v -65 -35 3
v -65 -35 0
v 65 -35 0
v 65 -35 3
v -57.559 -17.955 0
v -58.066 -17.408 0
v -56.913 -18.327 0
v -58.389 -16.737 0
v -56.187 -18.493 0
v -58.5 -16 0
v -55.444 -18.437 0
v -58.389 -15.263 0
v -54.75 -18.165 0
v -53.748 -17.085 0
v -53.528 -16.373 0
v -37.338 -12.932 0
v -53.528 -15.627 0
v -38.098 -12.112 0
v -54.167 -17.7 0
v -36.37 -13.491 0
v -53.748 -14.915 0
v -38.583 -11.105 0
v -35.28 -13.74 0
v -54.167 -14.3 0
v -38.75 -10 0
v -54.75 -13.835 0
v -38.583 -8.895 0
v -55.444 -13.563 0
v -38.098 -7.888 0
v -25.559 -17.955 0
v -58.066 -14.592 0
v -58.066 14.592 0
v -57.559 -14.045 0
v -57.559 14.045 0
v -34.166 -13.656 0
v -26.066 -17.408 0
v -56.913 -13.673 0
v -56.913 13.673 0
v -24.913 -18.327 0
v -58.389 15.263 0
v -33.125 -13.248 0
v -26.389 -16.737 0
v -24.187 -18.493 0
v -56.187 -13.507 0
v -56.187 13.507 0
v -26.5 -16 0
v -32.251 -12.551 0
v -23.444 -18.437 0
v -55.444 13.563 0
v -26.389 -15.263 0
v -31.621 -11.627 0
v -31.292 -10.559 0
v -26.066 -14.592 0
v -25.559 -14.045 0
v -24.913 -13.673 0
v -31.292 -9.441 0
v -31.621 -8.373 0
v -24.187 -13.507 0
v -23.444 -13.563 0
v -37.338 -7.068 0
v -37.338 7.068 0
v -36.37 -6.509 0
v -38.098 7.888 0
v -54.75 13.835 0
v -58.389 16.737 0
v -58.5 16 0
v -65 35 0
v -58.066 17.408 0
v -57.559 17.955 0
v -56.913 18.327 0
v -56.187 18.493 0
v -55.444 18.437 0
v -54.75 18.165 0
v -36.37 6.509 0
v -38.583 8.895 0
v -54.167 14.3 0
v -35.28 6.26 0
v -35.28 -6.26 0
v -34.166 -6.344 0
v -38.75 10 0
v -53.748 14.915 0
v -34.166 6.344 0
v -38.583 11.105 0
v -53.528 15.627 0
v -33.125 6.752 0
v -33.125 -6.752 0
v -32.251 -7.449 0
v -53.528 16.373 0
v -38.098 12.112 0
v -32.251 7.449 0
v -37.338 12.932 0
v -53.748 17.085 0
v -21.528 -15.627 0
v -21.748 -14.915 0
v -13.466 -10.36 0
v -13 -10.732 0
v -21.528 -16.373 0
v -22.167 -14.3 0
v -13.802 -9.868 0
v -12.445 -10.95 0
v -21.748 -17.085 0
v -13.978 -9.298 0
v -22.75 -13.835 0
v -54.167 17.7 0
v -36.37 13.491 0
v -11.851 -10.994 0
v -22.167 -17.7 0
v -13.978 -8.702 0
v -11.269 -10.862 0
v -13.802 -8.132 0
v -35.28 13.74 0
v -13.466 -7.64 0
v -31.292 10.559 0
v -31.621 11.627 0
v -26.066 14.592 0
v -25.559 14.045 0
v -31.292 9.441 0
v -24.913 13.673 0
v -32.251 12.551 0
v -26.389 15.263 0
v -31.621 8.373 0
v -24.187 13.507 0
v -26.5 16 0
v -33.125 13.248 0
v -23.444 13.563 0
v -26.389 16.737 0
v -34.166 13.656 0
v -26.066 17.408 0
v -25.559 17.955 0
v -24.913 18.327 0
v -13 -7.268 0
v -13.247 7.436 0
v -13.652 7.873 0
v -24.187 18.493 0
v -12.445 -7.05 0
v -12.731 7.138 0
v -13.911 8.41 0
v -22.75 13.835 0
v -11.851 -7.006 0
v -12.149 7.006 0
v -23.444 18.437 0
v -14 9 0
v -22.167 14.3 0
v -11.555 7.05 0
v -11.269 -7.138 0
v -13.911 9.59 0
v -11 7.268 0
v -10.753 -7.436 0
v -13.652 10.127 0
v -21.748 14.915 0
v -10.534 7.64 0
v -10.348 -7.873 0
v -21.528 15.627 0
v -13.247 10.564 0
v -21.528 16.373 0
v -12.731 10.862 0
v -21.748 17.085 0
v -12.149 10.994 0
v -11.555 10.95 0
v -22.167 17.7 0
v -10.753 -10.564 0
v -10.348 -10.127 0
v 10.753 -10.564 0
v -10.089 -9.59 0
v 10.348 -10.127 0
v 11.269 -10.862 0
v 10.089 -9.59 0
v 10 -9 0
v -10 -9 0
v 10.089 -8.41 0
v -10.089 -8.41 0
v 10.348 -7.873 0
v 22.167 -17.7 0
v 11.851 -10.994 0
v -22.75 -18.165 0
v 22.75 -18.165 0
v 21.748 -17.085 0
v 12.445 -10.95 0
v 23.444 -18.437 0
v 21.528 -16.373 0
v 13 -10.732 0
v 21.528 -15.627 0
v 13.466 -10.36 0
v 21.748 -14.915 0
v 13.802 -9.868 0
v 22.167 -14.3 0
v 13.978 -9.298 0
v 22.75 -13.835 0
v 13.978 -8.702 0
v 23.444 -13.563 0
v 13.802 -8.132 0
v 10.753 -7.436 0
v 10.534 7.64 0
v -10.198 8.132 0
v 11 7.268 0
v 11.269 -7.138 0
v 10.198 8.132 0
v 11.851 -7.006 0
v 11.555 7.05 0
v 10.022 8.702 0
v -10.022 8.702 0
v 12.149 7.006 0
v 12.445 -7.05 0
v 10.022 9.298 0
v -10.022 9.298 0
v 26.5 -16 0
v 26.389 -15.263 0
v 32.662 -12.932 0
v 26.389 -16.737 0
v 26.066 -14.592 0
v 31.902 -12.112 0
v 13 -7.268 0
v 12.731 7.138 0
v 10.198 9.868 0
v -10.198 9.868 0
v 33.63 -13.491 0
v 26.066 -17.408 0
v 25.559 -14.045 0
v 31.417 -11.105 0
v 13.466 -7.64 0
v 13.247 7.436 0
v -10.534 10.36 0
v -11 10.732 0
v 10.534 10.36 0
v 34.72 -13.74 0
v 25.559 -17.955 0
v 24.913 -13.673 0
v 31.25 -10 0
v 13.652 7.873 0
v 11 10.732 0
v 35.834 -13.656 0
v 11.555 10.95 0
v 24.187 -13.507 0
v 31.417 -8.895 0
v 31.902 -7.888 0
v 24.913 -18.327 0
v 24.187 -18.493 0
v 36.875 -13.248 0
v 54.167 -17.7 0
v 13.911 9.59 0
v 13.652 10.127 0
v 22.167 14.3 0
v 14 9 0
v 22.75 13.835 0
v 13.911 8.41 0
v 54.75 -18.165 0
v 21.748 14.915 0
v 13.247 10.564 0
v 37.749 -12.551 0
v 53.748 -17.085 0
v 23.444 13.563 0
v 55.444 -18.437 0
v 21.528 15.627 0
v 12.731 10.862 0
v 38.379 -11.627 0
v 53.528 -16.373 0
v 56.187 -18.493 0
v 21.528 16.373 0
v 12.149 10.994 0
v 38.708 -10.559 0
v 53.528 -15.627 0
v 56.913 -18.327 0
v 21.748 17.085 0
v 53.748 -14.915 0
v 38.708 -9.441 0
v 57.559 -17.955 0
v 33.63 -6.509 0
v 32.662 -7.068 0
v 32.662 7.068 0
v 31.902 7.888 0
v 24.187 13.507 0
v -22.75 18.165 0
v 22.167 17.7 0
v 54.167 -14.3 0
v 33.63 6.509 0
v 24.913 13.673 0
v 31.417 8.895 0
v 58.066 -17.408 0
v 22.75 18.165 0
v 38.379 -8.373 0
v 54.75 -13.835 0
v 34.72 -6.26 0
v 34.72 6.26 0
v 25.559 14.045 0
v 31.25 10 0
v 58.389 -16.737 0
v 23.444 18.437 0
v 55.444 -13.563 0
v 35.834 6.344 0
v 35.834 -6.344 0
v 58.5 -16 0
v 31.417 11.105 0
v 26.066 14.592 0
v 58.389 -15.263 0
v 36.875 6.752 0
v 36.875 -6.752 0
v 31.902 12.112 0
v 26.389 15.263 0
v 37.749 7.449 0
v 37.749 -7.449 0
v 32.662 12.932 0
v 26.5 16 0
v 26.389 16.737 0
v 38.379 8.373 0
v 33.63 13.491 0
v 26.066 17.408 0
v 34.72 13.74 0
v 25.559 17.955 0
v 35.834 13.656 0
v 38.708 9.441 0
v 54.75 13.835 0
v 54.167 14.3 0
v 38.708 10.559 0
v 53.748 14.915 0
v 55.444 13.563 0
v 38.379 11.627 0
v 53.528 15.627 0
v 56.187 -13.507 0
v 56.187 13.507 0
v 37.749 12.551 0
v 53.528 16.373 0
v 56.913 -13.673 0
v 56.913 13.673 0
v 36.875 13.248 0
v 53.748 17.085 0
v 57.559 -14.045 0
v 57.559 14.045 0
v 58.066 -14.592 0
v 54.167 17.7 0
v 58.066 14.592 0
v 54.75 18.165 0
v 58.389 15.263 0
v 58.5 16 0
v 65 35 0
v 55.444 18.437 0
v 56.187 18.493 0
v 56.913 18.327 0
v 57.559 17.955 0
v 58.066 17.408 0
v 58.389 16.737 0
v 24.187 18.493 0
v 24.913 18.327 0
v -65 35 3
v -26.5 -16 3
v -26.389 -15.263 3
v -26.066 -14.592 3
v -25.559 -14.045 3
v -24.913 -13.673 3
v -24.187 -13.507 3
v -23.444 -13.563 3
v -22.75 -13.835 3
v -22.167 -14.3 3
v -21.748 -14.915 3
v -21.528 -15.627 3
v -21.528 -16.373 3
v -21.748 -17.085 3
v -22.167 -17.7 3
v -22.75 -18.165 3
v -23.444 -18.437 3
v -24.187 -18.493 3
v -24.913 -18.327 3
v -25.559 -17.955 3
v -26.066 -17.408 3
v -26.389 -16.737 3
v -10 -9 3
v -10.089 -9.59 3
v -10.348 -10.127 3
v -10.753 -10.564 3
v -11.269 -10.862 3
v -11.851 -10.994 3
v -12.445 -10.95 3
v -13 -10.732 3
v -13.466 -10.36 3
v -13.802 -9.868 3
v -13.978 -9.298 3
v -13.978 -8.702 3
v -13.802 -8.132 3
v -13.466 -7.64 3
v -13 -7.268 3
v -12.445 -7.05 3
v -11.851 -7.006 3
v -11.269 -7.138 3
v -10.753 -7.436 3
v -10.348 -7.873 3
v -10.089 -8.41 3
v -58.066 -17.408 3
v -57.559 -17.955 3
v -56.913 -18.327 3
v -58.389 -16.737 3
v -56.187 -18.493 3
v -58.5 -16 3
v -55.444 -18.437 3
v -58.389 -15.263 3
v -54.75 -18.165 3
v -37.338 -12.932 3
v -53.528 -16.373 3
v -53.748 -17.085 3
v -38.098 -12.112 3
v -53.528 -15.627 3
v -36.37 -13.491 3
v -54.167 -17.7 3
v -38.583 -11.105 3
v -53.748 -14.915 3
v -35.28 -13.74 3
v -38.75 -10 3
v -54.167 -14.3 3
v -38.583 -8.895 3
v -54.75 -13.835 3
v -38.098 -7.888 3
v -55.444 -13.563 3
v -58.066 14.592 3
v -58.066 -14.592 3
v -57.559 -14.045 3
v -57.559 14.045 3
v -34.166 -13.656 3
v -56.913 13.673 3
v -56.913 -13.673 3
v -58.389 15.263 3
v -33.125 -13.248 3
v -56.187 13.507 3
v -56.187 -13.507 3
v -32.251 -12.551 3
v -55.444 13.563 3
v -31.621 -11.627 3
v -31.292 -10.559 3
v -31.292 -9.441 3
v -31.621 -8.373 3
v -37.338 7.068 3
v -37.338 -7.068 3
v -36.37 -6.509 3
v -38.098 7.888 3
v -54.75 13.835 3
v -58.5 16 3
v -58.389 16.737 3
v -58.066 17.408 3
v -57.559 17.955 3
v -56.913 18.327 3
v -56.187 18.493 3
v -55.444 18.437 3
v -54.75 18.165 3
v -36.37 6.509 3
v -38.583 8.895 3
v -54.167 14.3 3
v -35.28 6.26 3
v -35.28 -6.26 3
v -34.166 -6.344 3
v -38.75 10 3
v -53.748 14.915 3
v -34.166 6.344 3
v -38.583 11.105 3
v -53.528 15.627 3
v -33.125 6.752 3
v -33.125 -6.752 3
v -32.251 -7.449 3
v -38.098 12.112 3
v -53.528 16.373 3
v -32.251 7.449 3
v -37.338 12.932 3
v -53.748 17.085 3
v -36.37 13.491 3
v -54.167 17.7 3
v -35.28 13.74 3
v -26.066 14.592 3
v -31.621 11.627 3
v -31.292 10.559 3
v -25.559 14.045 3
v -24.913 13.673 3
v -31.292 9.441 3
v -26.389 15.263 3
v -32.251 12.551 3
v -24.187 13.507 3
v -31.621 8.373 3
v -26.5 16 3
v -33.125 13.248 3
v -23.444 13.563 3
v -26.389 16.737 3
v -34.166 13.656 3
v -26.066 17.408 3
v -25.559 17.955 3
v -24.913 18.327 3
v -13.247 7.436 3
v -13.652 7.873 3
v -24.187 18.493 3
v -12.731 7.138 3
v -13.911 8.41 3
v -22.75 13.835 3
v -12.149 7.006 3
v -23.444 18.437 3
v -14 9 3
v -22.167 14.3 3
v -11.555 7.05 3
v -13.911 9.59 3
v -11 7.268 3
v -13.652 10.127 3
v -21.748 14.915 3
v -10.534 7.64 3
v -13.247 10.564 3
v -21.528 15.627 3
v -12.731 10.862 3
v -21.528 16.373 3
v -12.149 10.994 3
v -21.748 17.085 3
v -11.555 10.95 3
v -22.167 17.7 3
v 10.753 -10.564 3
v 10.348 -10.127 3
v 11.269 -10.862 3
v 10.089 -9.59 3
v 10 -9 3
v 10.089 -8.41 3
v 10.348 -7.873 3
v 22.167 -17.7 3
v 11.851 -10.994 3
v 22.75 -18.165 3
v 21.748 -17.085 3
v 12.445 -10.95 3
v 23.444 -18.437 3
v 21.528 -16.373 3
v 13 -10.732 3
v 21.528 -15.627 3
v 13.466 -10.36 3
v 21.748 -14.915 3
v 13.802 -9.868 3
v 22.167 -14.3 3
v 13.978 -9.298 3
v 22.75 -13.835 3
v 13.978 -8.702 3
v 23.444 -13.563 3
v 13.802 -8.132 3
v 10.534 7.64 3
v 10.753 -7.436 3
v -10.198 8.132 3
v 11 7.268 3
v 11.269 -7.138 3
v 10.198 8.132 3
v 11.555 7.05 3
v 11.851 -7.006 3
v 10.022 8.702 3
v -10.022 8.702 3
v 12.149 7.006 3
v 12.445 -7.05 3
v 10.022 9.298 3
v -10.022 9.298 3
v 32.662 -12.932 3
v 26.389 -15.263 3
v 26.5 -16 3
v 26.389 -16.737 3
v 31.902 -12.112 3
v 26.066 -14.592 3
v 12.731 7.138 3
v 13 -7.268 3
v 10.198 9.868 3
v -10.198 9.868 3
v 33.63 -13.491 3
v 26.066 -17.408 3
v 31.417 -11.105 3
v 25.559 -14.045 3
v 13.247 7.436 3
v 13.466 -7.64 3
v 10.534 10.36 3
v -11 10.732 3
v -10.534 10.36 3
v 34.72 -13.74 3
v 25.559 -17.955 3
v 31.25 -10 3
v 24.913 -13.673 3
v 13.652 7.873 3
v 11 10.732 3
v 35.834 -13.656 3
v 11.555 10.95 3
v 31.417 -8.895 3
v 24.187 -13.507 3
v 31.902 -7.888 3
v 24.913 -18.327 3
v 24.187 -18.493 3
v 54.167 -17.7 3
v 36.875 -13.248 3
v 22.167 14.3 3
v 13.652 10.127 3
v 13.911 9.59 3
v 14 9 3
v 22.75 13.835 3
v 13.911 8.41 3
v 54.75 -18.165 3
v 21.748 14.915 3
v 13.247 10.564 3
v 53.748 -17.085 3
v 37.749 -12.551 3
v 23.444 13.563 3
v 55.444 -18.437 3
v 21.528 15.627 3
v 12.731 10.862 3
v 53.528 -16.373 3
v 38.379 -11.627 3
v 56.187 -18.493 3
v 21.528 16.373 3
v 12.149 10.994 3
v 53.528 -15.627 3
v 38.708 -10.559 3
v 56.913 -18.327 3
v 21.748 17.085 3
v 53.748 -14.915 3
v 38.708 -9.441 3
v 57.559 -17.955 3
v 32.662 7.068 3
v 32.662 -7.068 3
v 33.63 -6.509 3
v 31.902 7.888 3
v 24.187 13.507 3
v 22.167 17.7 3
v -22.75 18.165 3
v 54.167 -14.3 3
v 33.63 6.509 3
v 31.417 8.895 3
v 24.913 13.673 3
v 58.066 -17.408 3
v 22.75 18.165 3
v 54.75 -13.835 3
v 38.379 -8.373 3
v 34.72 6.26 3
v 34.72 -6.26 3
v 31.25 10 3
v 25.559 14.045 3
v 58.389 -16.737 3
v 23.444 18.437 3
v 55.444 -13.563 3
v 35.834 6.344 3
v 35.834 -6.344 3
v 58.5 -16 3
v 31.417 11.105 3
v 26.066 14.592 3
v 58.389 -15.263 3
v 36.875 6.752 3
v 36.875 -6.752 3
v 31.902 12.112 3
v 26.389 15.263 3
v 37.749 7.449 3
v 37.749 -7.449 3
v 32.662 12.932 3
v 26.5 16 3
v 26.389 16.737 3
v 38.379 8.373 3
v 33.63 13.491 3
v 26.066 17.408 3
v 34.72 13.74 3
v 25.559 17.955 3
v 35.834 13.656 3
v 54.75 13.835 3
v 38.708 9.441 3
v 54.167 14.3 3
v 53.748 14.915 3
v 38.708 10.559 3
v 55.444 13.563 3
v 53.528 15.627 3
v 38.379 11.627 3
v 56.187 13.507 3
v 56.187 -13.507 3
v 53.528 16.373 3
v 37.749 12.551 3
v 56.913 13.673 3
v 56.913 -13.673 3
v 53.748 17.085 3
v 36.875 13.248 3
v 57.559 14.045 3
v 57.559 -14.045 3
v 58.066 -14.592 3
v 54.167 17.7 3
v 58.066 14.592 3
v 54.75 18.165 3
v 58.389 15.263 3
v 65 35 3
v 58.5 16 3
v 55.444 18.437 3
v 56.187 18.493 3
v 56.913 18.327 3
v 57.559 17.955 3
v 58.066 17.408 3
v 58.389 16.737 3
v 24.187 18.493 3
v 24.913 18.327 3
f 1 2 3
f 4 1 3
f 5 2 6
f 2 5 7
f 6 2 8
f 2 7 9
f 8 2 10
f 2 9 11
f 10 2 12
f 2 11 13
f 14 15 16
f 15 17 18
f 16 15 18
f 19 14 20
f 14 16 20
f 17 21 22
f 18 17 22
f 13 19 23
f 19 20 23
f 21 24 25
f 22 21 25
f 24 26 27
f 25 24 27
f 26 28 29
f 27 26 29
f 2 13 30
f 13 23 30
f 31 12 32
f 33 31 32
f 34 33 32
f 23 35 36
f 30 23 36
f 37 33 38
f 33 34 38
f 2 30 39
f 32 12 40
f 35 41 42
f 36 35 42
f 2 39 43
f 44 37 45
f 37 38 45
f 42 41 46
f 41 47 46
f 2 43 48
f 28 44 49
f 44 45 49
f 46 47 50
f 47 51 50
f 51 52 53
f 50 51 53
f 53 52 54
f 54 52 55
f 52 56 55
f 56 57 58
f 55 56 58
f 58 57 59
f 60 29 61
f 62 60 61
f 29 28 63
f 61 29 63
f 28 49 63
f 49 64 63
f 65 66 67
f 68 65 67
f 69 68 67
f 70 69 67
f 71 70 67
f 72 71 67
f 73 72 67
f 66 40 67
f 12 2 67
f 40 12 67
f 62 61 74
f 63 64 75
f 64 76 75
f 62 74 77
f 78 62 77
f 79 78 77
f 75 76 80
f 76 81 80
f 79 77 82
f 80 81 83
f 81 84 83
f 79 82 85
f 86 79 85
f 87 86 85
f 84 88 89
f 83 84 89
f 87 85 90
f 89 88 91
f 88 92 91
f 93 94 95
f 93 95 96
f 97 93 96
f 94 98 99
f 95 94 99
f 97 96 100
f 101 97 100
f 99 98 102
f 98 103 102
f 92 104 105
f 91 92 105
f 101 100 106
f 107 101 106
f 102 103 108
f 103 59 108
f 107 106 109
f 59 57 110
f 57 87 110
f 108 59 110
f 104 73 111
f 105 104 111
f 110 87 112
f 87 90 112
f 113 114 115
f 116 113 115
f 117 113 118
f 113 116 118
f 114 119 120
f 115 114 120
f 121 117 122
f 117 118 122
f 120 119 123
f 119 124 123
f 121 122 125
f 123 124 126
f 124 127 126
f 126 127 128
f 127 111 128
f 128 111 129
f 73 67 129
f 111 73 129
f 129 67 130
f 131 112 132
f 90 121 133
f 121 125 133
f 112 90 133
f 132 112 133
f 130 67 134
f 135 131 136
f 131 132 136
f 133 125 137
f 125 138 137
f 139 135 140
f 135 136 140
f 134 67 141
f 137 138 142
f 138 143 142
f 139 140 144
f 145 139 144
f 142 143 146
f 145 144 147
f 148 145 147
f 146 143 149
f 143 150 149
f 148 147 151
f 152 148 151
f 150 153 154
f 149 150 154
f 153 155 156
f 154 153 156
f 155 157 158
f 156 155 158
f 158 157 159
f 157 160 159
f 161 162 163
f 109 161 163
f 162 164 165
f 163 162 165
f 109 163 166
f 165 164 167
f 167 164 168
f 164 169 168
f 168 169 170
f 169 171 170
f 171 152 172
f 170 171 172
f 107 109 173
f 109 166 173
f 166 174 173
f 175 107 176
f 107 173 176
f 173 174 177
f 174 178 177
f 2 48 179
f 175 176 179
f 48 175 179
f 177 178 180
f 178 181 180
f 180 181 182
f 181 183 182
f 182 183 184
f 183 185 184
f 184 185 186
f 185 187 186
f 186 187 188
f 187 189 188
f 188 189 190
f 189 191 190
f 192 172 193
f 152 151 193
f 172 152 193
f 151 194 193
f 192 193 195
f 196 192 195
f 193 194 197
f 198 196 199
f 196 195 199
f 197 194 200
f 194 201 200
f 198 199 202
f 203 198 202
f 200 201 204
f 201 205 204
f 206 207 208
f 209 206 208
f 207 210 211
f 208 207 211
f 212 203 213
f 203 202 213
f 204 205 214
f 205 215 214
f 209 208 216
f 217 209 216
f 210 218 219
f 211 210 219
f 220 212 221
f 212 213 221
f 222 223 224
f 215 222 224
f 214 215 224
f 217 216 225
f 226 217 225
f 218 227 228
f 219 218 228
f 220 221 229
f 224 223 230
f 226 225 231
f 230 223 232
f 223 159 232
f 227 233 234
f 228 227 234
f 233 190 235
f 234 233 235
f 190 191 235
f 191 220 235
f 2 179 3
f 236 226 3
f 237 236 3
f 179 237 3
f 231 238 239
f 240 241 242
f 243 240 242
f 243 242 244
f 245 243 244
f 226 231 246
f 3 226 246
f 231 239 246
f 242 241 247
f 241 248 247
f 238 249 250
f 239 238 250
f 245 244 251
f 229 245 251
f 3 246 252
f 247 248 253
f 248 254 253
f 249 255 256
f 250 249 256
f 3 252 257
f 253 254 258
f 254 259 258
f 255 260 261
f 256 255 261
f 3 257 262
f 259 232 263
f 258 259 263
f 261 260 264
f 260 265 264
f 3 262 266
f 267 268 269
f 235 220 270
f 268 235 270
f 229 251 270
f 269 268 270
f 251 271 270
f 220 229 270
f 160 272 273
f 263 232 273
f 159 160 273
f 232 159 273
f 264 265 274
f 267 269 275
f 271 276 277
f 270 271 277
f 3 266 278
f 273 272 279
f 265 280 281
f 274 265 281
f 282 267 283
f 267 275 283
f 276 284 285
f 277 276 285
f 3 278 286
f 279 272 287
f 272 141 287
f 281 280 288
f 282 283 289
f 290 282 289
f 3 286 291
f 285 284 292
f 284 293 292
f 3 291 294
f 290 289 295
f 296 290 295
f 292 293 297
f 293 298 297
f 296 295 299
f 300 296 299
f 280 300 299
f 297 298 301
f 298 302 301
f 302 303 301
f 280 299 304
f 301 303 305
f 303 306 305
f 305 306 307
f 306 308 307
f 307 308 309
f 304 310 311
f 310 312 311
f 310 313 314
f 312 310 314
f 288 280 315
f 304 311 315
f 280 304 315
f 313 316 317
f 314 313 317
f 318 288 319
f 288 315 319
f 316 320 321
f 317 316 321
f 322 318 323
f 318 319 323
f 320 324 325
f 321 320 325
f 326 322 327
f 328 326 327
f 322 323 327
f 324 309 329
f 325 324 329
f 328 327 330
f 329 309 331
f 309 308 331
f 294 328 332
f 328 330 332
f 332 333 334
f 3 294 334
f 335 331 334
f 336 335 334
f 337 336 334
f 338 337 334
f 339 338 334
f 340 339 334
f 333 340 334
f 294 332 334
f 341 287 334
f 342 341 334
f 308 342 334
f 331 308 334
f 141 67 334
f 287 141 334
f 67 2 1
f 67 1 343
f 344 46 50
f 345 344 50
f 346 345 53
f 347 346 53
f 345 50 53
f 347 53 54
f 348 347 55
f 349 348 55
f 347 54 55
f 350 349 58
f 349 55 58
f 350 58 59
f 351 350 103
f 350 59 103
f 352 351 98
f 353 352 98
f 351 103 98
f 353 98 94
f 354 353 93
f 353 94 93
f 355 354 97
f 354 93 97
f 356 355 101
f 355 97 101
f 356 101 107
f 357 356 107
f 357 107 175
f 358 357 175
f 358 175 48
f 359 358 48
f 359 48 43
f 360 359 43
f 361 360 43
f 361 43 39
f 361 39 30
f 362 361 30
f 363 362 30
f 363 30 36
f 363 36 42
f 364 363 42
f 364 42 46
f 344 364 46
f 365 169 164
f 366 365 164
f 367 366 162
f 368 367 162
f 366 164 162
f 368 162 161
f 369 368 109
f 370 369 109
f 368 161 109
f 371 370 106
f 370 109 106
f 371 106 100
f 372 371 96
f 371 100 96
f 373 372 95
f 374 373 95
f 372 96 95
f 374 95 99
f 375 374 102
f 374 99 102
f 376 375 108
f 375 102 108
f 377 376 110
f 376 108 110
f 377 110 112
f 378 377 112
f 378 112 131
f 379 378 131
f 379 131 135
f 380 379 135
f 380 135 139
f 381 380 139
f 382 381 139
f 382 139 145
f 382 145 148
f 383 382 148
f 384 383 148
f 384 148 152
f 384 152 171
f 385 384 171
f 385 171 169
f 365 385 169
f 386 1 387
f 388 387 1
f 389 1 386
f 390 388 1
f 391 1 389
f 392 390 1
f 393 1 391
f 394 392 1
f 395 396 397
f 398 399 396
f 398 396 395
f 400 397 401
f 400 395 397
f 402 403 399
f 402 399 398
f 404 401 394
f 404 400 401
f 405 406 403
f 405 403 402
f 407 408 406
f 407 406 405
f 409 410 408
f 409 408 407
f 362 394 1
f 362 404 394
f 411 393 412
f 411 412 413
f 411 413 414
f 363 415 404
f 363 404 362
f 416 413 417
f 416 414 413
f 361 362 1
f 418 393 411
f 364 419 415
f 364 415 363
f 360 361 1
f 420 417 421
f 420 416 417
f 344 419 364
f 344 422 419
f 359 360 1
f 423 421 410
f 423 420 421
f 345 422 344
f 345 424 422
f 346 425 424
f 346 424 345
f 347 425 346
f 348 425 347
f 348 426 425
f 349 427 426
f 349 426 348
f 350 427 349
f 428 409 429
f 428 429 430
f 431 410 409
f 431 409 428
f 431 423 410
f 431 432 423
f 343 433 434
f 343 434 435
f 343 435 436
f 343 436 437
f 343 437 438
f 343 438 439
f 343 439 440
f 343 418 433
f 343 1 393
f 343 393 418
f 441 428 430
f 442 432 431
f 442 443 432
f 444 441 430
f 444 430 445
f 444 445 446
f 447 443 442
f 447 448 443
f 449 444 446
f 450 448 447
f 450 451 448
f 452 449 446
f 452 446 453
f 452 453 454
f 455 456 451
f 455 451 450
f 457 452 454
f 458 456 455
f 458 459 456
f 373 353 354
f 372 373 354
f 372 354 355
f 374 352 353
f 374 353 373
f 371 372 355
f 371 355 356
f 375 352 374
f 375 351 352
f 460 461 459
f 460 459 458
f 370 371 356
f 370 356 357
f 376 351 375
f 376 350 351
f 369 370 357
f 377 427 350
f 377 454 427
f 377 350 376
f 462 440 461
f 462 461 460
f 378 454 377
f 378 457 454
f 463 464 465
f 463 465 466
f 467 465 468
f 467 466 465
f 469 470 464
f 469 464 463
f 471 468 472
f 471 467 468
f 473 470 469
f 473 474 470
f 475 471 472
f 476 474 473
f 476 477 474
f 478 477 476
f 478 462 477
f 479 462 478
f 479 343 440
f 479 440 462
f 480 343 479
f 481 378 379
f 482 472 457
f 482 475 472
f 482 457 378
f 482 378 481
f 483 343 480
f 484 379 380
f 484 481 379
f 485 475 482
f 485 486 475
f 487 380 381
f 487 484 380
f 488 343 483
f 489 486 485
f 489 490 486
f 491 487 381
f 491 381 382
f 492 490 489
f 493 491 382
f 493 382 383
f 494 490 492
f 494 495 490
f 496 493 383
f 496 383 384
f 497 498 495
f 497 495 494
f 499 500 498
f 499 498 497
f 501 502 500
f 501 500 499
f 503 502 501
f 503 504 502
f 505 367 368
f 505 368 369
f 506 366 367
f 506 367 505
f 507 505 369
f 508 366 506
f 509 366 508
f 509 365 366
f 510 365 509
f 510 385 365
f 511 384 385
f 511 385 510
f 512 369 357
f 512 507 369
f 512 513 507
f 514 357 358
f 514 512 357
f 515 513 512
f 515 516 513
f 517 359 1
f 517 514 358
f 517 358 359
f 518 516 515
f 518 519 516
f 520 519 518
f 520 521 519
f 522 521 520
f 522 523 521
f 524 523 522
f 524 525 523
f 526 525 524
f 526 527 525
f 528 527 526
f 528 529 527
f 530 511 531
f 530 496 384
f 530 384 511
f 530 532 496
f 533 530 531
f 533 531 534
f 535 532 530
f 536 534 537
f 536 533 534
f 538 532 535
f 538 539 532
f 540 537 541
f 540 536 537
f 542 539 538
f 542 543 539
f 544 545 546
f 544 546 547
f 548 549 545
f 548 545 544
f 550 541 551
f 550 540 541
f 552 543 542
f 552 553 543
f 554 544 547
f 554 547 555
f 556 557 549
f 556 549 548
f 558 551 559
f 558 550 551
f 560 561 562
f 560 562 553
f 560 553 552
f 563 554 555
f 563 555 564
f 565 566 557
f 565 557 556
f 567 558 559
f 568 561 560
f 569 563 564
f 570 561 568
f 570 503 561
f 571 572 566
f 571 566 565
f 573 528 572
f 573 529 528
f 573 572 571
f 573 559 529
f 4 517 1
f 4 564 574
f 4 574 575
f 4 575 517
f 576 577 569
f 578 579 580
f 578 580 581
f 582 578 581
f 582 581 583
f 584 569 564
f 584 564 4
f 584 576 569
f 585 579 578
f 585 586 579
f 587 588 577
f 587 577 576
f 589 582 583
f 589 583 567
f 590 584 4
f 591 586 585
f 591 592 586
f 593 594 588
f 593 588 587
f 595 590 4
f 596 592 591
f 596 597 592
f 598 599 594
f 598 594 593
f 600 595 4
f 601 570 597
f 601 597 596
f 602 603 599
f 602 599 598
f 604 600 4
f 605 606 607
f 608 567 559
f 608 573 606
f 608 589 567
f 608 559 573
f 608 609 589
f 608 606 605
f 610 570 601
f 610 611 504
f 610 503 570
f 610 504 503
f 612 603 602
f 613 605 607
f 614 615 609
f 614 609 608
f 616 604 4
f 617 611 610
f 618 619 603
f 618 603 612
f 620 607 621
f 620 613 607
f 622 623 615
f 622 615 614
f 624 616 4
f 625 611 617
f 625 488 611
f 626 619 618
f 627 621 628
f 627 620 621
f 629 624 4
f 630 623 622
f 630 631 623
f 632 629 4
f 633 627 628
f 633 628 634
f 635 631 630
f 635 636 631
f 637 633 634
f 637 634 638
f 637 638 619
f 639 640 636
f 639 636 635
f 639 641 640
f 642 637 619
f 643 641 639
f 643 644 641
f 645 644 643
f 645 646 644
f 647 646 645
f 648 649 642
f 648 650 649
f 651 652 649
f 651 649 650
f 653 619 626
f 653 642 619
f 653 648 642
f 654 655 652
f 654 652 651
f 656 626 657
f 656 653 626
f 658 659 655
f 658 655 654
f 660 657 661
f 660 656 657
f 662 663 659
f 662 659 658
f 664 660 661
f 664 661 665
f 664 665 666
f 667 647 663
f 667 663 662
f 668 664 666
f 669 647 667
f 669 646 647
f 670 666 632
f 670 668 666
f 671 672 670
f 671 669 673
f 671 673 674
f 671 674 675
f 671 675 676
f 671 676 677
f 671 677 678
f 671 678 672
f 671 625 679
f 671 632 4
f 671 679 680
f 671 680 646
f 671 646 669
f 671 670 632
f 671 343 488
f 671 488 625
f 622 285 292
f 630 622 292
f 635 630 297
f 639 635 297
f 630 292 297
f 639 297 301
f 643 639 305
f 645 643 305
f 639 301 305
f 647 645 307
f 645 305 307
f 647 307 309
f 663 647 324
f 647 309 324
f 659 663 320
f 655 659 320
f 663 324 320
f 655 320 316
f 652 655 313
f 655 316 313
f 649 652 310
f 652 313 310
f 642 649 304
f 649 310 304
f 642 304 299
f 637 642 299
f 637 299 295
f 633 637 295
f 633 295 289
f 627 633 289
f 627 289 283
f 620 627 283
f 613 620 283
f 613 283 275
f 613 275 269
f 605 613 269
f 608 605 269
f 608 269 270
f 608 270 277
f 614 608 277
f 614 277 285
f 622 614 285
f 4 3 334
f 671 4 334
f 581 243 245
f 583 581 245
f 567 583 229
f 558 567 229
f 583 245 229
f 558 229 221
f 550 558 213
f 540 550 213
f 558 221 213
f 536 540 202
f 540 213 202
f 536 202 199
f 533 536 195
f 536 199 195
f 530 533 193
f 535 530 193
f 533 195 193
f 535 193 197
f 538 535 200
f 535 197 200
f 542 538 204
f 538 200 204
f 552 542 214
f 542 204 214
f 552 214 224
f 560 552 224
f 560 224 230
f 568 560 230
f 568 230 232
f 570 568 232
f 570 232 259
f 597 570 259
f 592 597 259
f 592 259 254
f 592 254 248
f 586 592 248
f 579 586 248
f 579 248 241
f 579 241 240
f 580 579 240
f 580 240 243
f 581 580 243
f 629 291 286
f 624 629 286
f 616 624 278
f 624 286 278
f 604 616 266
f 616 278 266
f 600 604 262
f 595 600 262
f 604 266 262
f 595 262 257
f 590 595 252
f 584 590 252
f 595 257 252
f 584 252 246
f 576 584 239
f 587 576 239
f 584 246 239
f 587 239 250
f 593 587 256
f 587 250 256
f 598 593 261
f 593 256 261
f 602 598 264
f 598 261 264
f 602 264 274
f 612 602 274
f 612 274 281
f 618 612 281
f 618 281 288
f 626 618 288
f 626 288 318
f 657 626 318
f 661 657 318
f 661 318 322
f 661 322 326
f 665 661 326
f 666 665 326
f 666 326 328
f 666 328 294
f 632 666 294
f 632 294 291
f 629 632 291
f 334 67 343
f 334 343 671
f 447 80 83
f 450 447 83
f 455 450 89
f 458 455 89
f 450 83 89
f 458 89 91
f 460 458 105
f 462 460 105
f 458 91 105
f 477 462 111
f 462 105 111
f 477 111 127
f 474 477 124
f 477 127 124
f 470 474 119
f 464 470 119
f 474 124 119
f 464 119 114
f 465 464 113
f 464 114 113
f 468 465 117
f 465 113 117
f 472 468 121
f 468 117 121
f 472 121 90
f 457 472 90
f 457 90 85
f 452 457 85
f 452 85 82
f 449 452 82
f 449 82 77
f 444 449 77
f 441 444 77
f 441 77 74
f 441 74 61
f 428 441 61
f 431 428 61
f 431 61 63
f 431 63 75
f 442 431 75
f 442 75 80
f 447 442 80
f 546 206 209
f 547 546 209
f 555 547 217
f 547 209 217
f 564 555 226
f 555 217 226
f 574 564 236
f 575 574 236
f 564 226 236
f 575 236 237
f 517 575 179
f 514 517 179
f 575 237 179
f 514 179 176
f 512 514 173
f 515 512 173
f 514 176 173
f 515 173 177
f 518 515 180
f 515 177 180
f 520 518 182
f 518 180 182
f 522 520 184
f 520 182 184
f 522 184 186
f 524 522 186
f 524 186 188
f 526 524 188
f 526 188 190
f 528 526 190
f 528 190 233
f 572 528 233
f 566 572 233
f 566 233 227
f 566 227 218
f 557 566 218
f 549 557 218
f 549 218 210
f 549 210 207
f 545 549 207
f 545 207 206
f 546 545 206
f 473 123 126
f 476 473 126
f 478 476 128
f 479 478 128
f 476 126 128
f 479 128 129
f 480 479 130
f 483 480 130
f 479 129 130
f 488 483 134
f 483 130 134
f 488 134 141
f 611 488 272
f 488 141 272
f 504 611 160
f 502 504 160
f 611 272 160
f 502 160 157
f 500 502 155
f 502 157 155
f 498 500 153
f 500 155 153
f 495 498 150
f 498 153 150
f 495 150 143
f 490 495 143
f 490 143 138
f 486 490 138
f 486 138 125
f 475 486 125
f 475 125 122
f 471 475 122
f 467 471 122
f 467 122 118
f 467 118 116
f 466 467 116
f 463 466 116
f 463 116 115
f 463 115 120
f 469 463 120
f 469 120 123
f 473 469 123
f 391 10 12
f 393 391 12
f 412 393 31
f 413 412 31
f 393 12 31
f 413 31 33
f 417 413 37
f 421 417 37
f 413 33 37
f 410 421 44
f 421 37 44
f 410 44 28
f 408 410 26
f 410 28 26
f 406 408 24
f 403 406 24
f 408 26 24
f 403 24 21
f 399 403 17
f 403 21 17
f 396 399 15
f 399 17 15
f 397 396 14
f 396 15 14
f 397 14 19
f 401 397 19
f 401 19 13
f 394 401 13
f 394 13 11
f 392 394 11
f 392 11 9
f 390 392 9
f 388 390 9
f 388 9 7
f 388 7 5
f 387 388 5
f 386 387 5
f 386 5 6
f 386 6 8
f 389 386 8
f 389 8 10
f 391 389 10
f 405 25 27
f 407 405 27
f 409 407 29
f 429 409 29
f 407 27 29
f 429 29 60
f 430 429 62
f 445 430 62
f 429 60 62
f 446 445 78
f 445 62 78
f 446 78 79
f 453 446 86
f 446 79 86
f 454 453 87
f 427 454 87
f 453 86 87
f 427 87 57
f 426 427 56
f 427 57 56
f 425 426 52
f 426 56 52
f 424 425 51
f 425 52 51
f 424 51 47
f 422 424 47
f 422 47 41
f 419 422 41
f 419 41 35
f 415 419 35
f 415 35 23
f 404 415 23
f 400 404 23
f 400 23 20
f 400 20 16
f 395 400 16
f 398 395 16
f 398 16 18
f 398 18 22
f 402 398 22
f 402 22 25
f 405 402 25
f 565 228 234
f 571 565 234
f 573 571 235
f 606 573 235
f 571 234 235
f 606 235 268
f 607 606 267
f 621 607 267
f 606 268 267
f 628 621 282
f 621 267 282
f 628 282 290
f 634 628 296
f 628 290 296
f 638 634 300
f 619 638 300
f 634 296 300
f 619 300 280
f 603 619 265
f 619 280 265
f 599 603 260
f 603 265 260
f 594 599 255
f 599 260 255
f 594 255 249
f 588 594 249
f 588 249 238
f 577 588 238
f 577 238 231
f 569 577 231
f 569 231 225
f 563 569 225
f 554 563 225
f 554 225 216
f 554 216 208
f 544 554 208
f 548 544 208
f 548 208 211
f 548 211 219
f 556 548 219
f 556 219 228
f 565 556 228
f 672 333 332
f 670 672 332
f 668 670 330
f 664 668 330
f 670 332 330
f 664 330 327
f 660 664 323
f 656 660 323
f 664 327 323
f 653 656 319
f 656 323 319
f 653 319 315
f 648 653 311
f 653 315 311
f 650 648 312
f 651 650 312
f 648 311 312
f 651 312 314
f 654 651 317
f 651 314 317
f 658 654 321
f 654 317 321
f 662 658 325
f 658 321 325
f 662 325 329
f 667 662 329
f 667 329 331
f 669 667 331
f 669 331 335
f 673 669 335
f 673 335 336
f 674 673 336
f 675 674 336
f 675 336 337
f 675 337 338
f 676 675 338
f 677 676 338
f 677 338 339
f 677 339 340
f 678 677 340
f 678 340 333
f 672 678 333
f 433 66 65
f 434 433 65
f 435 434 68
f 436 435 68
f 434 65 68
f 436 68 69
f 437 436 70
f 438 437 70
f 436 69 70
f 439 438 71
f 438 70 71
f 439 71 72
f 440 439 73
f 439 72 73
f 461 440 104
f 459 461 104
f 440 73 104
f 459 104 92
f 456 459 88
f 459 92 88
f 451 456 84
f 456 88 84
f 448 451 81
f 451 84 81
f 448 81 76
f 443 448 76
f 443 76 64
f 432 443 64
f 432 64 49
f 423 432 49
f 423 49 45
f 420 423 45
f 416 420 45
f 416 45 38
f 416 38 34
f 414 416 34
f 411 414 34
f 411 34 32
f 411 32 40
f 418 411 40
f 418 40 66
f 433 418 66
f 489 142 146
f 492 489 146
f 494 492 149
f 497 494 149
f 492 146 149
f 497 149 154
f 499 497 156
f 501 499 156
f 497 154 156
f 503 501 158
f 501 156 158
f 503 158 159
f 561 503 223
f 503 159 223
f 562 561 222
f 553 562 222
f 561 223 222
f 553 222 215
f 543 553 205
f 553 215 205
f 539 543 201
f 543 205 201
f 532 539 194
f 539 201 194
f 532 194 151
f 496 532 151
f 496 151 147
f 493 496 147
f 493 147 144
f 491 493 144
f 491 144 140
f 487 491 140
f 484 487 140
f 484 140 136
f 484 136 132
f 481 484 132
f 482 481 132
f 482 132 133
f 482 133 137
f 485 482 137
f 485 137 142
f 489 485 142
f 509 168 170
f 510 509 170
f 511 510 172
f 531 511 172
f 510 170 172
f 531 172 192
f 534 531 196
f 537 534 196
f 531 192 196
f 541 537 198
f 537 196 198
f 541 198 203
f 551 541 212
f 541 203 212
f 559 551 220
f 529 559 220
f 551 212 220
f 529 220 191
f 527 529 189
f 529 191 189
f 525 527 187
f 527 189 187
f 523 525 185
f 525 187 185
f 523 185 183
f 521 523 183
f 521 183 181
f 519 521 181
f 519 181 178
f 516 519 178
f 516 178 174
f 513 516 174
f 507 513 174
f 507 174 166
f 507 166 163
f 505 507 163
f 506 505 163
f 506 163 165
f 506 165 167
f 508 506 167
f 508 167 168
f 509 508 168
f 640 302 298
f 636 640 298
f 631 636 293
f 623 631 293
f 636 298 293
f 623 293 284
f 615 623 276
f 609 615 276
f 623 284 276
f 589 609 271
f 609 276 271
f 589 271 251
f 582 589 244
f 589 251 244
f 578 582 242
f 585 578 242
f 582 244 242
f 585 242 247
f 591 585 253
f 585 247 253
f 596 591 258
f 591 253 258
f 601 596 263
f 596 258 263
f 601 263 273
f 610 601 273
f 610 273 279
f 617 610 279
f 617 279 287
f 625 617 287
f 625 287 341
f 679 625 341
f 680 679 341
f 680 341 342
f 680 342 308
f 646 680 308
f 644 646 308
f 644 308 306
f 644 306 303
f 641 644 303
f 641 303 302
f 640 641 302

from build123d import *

# Parameters (mm, degrees)
SKETCH1_W          = 130
SKETCH1_H          = 70
BASE_FLANGE1_DEPTH = 3
SKETCH12_R         = 2.5
SKETCH12_R_2       = 2
CUT_EXTRUDE1_DEPTH = 10
SKETCH13_R         = 3.75
CUT_EXTRUDE2_DEPTH = 10


# Sheet-metal steps are written as plain solids
with BuildPart() as part:
    # Sketch1 → Base-Flange1 (new body)
    with BuildSketch(Plane.XY):
        Rectangle(SKETCH1_W, SKETCH1_H)
    extrude(amount=BASE_FLANGE1_DEPTH)

    # Sketch12 → Cut-Extrude1 (cut)
    with BuildSketch(Plane(origin=(0, 0, 0), x_dir=(-1, 0, 0), z_dir=(0, 0, -1))):
        with Locations((56, 16)):
            Circle(SKETCH12_R)
        with Locations((56, -16)):
            Circle(SKETCH12_R)
        with Locations((24, -16)):
            Circle(SKETCH12_R)
        with Locations((24, 16)):
            Circle(SKETCH12_R)
        with Locations(Location((-24, 16, 0), (0, 0, 180))):
            Circle(SKETCH12_R)
        with Locations(Location((-24, -16, 0), (0, 0, 180))):
            Circle(SKETCH12_R)
        with Locations(Location((-56, -16, 0), (0, 0, 180))):
            Circle(SKETCH12_R)
        with Locations(Location((-56, 16, 0), (0, 0, 180))):
            Circle(SKETCH12_R)
        with Locations((12, 9)):
            Circle(SKETCH12_R_2)
        with Locations(Location((-12, 9, 0), (0, 0, 180))):
            Circle(SKETCH12_R_2)
        with Locations((-12, -9)):
            Circle(SKETCH12_R_2)
        with Locations(Location((12, -9, 0), (0, 0, 180))):
            Circle(SKETCH12_R_2)
    extrude(amount=-CUT_EXTRUDE1_DEPTH, mode=Mode.SUBTRACT)

    # Sketch13 → Cut-Extrude2 (cut)
    with BuildSketch(Plane(origin=(0, 0, 0), x_dir=(-1, 0, 0), z_dir=(0, 0, -1))):
        with Locations((35, 10)):
            Circle(SKETCH13_R)
        with Locations((-35, 10)):
            Circle(SKETCH13_R)
        with Locations((-35, -10)):
            Circle(SKETCH13_R)
        with Locations((35, -10)):
            Circle(SKETCH13_R)
    extrude(amount=-CUT_EXTRUDE2_DEPTH, mode=Mode.SUBTRACT)


solid = part.part
